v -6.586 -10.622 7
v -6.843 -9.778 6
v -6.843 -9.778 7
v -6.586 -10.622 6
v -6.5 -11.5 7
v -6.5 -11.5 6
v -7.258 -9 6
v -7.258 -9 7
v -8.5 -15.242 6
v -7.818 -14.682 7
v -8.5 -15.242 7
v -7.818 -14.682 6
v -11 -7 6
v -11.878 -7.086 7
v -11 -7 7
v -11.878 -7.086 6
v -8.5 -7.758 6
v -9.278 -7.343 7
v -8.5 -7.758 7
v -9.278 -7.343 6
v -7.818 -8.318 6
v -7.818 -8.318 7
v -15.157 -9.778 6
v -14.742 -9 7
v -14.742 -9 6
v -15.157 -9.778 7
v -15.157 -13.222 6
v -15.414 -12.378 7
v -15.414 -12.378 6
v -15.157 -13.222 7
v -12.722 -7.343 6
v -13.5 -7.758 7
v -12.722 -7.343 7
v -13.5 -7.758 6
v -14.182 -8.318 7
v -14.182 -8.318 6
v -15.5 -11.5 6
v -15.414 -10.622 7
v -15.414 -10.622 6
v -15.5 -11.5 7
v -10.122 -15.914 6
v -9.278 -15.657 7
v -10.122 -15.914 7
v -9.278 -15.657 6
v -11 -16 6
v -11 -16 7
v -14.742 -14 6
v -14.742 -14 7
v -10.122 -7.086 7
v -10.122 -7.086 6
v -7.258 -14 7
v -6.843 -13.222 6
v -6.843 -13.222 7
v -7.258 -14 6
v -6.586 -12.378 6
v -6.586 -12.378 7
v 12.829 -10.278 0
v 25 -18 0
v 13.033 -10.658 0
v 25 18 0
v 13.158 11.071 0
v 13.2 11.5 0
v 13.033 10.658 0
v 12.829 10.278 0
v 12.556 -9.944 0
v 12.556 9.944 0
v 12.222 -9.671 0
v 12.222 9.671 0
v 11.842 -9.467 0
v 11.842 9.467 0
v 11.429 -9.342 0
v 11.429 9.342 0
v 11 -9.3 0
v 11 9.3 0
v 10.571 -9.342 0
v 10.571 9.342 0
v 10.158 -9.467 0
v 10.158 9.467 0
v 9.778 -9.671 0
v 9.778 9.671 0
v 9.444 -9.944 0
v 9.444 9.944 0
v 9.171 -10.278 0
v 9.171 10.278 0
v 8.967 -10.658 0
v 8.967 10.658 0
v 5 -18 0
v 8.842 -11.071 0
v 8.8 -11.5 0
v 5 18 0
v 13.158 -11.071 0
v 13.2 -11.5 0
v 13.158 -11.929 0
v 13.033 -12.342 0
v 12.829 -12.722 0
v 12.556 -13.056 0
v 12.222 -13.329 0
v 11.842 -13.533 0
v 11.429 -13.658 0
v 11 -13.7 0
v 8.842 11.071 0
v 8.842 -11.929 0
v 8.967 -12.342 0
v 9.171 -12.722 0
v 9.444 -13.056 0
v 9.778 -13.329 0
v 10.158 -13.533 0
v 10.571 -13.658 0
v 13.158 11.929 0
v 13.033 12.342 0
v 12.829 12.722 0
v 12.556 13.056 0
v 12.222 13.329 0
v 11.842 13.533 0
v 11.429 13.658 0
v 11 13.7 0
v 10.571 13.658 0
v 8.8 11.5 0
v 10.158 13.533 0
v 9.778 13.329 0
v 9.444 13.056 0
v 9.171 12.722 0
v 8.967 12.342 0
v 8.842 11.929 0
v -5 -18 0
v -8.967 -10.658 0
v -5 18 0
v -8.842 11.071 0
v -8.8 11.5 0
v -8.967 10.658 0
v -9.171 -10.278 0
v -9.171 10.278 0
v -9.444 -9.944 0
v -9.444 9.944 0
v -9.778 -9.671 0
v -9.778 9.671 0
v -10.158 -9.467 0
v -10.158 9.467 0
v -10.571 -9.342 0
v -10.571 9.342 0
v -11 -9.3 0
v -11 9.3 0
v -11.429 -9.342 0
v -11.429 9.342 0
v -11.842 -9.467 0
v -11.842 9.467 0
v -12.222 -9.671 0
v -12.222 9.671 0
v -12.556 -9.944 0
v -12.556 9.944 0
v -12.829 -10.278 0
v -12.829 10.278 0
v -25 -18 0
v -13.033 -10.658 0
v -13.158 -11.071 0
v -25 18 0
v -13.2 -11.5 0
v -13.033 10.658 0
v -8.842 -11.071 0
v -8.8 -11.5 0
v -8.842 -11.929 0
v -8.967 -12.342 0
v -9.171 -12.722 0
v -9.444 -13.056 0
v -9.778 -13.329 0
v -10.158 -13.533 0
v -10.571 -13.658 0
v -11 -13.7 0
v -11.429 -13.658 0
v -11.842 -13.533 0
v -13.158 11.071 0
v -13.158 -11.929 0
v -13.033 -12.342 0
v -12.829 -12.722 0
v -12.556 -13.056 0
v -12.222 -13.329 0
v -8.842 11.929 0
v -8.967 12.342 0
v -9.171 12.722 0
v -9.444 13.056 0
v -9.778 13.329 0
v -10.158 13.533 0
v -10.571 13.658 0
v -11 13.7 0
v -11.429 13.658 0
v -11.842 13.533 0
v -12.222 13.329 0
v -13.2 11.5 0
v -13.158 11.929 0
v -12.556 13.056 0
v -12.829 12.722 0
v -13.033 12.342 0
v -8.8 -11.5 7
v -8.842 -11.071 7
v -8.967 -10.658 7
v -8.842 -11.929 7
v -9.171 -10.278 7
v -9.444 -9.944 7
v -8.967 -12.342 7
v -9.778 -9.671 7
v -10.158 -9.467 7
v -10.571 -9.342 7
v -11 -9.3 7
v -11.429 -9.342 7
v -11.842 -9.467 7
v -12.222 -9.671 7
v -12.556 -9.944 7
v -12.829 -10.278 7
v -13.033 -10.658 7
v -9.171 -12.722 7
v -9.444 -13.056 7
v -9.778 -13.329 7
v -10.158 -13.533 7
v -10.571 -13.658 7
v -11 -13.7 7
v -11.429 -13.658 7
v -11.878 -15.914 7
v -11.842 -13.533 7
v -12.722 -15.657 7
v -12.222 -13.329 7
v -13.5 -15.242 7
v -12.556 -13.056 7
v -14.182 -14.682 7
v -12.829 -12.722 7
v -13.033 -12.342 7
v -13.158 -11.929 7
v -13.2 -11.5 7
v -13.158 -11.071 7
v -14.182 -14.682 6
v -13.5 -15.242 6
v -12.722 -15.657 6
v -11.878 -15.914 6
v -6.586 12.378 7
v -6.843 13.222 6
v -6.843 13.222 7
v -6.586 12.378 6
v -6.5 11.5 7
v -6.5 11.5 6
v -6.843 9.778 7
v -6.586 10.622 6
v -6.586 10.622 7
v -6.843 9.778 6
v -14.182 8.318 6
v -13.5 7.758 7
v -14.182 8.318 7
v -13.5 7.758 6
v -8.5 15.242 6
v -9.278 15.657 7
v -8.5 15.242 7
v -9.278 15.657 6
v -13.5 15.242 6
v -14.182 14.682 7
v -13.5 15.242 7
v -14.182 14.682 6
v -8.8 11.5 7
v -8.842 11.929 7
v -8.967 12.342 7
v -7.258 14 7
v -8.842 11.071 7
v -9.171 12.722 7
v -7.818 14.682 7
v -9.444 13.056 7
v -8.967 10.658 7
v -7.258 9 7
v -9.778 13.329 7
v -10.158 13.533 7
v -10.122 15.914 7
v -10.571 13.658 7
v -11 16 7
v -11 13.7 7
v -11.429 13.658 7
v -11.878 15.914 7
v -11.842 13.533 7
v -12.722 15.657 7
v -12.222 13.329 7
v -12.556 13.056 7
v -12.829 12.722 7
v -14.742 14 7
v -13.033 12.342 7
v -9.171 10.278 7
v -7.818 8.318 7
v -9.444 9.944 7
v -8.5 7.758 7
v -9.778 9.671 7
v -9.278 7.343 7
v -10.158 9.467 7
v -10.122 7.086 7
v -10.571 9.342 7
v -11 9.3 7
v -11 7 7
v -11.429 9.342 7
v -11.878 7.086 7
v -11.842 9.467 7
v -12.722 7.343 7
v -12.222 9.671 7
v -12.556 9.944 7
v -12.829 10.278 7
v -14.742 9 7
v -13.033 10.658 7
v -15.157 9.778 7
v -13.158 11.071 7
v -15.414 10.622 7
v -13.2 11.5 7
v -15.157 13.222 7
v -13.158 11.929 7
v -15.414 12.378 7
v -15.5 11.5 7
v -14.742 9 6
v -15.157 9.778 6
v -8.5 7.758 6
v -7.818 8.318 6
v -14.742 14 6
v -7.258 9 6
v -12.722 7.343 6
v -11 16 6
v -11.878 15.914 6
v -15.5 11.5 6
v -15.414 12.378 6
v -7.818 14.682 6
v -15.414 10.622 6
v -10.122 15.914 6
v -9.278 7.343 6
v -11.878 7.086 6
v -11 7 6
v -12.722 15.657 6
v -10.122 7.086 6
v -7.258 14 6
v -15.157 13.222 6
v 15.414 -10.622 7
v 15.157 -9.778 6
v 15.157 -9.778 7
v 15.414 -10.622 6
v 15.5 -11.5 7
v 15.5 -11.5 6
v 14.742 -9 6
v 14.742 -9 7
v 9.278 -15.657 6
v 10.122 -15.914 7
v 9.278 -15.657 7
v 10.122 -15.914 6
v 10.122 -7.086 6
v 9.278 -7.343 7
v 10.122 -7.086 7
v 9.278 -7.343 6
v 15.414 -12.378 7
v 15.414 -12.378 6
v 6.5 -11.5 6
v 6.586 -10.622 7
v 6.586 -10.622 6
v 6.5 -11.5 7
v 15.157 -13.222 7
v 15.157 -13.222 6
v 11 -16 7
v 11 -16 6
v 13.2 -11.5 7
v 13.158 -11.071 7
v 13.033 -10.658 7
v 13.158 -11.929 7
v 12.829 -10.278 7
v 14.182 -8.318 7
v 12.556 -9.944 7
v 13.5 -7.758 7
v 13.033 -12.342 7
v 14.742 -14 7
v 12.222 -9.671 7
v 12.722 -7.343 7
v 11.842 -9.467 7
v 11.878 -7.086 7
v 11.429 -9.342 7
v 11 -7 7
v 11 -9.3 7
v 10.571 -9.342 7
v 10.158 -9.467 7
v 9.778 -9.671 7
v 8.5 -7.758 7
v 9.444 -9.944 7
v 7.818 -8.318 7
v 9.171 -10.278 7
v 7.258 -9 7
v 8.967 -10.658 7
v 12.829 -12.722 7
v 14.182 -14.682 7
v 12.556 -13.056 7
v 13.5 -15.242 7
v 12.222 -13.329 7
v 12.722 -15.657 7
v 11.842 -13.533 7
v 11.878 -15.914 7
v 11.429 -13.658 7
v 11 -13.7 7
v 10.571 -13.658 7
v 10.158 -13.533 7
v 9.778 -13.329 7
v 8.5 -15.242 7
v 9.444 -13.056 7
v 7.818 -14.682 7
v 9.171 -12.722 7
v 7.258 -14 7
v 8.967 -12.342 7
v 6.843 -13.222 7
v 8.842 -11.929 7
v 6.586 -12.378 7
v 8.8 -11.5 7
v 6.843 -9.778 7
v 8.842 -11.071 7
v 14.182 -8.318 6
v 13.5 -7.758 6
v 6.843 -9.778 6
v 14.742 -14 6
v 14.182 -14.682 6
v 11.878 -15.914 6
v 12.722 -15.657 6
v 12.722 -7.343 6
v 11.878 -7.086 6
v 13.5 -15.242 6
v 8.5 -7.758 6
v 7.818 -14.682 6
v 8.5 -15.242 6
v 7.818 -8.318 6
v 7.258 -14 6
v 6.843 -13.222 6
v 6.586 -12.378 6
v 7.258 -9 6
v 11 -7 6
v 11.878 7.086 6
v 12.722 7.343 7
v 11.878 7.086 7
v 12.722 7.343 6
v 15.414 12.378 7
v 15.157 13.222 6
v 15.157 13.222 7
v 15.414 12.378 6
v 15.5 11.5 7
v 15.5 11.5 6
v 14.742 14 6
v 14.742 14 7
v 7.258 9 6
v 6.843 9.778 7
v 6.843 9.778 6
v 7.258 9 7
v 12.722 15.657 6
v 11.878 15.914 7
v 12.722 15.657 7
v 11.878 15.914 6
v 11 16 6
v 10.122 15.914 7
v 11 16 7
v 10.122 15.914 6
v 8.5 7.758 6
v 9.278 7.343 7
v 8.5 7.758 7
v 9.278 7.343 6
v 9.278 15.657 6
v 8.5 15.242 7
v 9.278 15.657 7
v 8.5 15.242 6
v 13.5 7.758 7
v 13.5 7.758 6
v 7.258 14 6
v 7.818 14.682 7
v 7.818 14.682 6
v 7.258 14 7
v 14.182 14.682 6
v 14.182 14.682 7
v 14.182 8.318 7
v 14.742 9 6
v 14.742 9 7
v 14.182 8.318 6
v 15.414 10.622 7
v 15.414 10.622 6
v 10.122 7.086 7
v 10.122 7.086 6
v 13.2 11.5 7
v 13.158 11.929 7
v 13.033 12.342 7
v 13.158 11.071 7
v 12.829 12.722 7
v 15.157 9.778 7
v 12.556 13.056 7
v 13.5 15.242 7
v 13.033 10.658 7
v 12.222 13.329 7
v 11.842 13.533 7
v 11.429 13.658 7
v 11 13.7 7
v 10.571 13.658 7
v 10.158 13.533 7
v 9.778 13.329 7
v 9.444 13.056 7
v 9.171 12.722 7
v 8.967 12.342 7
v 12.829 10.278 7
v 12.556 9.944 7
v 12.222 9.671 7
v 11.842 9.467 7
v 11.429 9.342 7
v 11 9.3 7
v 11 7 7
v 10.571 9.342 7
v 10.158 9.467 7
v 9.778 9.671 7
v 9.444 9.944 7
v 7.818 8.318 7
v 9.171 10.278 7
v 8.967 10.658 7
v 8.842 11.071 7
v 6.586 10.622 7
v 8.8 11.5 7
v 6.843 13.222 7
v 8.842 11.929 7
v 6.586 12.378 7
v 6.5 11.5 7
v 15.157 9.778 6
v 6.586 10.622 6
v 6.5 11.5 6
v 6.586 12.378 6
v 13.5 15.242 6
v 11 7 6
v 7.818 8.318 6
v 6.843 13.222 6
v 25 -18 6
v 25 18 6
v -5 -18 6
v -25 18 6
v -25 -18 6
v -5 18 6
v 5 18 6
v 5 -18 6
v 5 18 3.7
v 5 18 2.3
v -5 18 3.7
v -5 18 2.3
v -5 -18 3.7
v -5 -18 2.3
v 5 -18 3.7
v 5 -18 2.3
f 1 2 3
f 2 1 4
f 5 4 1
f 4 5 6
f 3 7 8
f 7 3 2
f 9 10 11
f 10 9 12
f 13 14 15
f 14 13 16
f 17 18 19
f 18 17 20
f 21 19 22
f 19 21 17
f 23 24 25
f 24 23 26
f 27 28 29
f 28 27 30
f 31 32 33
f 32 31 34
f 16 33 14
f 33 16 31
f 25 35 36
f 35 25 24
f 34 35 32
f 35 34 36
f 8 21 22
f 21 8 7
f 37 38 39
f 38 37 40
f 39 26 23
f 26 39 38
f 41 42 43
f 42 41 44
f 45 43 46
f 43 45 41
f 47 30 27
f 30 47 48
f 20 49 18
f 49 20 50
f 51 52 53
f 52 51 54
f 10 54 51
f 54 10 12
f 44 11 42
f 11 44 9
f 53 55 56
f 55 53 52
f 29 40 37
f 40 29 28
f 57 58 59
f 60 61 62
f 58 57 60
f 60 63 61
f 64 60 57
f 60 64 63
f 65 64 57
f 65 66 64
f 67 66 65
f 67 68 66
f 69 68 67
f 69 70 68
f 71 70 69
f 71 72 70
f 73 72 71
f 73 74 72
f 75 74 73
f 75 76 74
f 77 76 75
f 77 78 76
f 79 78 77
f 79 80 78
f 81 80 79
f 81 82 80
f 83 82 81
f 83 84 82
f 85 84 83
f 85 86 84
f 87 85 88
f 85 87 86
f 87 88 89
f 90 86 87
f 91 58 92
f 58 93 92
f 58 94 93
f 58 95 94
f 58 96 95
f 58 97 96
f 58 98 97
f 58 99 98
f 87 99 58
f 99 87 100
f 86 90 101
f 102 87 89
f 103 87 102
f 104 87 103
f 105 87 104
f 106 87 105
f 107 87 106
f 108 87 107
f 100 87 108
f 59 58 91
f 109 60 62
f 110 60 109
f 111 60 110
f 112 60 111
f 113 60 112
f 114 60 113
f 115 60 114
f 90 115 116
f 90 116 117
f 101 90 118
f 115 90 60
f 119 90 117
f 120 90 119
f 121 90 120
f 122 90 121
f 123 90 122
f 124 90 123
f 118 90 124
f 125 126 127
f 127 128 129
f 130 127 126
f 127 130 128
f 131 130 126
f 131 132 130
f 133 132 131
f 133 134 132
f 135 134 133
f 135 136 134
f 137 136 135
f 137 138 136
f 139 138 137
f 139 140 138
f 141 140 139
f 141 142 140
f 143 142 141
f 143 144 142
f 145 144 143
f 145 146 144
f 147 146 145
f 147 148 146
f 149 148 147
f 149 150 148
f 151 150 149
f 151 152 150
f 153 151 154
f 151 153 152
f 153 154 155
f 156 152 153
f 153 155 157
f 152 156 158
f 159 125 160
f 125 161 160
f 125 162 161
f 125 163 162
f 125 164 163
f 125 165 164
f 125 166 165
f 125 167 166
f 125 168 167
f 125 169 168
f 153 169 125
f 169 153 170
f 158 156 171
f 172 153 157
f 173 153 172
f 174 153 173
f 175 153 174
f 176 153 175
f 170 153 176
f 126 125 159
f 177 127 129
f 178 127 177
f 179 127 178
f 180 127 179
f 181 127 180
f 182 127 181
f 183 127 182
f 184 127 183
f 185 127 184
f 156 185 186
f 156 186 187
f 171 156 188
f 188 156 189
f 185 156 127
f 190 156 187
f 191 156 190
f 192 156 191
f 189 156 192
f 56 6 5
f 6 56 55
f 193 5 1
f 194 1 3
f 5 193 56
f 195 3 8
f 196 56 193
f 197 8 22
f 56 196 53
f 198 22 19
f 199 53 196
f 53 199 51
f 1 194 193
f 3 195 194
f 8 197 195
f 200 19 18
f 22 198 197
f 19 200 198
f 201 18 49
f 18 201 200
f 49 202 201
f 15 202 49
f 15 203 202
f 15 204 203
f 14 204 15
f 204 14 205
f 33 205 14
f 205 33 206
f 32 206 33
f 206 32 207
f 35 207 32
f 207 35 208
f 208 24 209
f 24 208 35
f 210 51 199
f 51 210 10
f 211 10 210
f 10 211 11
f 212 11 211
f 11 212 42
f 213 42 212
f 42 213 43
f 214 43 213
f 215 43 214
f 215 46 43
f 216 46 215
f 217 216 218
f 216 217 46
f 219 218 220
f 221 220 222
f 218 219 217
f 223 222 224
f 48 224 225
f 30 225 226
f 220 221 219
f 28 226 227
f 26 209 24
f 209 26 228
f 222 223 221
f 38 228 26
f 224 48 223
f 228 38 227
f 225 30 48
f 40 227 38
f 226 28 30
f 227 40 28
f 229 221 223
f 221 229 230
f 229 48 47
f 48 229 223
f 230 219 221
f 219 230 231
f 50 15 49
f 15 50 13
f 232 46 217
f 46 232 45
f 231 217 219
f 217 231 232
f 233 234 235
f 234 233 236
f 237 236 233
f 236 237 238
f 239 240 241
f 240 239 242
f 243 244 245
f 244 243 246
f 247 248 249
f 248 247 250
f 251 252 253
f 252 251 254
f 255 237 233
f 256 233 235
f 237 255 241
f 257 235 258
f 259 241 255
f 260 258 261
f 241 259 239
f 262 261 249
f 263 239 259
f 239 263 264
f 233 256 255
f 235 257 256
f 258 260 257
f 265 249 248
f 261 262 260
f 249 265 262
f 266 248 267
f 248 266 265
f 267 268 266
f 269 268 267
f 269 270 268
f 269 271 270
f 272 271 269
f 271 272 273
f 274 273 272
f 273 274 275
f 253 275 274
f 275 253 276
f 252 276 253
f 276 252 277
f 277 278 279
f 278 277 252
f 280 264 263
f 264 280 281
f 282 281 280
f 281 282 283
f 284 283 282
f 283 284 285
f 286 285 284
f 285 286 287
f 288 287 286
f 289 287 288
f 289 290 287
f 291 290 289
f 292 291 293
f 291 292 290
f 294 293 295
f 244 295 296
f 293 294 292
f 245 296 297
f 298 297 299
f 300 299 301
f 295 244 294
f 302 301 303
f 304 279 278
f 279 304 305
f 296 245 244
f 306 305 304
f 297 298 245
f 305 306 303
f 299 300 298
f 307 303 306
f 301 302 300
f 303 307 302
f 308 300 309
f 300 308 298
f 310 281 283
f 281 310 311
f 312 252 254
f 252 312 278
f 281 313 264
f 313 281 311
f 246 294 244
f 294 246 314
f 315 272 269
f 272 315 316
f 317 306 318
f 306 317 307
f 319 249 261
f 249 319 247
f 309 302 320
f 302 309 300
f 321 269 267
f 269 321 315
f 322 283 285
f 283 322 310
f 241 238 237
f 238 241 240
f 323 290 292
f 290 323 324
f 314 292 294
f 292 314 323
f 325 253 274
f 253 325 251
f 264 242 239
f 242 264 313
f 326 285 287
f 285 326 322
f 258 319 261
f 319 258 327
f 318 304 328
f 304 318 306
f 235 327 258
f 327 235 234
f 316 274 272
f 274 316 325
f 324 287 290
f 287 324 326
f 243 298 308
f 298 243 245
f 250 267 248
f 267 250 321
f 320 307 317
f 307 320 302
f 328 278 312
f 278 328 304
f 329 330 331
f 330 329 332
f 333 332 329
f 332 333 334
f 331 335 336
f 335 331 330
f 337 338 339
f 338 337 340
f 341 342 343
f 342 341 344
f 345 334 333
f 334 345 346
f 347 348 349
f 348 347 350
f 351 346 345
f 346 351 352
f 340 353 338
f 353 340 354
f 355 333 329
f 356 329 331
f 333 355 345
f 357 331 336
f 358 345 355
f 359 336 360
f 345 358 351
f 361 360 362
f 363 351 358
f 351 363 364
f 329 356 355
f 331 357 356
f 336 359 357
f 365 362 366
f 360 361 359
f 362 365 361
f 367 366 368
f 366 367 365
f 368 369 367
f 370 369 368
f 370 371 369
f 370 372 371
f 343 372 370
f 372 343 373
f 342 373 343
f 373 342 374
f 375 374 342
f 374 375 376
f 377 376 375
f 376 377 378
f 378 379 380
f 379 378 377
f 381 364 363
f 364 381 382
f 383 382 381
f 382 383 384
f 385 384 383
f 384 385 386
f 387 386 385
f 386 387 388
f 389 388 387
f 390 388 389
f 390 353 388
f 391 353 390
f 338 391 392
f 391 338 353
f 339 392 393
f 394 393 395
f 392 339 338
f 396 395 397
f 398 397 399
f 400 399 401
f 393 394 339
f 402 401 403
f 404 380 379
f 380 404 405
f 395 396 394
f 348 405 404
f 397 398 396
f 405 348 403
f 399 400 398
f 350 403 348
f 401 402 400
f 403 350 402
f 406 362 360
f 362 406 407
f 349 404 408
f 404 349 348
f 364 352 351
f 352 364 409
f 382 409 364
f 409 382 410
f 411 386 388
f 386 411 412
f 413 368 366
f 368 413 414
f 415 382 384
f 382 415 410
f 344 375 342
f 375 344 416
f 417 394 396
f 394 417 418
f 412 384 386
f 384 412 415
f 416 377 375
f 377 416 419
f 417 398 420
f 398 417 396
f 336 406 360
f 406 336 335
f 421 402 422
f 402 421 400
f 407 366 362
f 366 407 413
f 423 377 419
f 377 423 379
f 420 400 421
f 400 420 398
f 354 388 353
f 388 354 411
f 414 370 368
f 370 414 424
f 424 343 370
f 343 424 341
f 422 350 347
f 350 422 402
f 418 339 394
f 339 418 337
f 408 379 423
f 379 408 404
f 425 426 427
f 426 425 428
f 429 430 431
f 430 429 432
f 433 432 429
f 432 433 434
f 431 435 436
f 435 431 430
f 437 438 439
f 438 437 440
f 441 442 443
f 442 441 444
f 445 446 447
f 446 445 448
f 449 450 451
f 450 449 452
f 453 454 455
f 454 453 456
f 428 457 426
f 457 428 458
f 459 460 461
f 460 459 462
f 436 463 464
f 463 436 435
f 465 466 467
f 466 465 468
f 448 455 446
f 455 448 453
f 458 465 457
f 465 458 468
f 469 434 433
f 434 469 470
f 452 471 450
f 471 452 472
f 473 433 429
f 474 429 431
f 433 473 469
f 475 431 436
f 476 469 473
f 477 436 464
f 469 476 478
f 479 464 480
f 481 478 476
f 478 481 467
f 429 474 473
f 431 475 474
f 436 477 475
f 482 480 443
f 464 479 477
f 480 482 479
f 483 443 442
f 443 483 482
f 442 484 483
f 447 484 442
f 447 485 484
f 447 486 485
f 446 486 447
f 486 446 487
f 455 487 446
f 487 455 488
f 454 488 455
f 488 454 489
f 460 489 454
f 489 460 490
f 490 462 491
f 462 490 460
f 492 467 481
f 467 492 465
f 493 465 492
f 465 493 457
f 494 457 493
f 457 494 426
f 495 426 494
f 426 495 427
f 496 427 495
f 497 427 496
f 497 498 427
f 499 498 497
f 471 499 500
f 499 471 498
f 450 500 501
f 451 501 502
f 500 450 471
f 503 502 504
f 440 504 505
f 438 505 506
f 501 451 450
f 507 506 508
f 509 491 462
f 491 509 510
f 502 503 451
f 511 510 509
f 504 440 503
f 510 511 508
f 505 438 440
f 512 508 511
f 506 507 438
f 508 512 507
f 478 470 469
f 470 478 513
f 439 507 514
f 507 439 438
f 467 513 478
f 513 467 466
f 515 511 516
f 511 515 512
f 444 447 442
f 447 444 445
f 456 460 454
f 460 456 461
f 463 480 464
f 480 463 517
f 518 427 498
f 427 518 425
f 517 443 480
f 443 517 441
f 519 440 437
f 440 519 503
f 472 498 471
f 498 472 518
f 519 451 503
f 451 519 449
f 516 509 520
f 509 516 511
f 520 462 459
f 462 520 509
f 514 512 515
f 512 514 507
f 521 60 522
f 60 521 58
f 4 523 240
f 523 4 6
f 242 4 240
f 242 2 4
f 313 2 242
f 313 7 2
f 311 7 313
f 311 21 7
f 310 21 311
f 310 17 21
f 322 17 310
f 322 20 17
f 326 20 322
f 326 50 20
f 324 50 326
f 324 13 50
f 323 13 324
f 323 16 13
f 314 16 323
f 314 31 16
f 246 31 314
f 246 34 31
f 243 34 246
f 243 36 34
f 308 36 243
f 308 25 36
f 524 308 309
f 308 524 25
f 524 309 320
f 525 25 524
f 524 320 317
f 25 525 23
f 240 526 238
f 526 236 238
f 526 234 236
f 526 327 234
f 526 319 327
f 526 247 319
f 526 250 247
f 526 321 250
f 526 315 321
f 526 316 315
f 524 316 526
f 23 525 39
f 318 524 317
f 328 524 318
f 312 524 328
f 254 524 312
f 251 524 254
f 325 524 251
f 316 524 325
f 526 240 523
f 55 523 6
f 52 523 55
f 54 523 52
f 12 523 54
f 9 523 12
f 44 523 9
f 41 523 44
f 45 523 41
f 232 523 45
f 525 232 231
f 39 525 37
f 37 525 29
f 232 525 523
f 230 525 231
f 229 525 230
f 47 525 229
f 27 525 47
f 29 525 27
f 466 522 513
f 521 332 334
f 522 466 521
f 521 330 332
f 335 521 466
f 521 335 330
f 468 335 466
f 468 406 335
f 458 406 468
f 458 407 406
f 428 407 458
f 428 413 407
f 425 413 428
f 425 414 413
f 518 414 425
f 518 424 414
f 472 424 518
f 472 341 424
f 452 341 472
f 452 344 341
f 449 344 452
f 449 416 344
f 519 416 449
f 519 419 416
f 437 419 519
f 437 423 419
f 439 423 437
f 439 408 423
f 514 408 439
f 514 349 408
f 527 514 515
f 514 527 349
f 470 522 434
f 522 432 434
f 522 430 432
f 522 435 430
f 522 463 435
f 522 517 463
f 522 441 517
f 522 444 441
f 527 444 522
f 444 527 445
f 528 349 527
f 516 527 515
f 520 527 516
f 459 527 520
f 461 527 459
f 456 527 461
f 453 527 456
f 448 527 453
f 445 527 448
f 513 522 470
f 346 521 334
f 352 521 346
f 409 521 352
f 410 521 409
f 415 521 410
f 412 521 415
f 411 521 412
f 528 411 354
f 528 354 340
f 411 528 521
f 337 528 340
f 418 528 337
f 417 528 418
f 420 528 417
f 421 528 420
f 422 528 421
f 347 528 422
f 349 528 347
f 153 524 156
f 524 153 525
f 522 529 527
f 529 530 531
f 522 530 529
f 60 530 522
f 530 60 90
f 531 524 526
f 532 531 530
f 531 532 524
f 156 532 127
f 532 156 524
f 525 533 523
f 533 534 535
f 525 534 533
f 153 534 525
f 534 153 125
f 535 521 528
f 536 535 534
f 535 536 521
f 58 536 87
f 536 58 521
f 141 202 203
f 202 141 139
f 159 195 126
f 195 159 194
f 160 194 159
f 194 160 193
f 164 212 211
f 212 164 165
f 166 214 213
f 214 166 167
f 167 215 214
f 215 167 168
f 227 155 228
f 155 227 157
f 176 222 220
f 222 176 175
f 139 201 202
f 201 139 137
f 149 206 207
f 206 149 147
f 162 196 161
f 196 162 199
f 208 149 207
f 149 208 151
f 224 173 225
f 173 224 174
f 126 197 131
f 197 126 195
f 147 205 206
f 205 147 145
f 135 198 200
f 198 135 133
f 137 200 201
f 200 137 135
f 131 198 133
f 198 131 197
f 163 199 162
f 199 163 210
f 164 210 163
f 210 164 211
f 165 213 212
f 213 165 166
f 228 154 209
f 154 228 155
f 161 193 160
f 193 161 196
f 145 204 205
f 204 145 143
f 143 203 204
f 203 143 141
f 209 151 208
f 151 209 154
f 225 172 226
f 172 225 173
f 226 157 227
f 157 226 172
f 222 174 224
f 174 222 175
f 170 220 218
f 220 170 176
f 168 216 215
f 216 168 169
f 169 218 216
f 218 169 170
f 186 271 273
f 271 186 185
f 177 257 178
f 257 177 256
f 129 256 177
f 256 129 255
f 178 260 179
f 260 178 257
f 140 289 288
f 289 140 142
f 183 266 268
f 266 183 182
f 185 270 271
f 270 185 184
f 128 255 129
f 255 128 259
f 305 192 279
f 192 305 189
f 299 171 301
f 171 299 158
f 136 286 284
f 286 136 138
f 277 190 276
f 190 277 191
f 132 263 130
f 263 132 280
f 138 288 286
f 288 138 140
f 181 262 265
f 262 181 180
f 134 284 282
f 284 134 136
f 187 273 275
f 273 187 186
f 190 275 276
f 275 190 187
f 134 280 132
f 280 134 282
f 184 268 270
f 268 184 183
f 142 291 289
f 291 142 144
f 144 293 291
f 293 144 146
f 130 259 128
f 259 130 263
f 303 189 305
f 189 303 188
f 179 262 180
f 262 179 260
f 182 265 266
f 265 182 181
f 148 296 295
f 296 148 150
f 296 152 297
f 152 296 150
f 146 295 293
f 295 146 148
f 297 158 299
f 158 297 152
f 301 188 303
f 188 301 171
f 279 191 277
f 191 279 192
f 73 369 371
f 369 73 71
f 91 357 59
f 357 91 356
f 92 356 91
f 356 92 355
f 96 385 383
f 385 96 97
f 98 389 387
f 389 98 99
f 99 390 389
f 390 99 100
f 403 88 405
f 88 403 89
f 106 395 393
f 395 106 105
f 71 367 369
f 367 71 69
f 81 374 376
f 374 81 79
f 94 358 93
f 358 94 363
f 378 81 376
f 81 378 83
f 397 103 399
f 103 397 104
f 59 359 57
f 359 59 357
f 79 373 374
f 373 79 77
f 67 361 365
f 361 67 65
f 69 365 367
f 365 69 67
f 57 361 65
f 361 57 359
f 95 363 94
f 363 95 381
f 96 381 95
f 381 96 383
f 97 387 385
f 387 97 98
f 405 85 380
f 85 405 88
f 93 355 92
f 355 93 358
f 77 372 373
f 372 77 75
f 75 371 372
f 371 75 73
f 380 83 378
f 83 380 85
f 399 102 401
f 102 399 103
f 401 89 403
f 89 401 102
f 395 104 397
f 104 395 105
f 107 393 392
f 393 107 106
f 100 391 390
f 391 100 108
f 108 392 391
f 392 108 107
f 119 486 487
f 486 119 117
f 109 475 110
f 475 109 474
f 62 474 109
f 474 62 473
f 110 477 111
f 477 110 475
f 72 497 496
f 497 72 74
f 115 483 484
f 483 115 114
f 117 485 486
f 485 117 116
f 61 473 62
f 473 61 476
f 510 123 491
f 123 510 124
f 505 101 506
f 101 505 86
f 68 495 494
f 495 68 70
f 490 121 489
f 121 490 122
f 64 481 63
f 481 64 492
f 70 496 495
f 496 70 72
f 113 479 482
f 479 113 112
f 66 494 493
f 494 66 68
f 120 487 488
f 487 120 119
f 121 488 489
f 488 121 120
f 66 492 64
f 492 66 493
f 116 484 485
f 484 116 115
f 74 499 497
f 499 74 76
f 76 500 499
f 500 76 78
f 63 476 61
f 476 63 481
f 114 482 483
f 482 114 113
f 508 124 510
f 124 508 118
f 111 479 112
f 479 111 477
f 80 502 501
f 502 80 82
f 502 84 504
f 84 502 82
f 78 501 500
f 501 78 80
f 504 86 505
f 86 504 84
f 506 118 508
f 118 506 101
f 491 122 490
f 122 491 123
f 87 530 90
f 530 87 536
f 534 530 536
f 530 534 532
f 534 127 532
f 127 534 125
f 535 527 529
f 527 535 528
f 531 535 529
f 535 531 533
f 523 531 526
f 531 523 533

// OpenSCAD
$fn = 32;

// ----------------------------------------------------------------------
// Living hinge: 50 x 36 mm plates, 1.4 mm flexible web
// ----------------------------------------------------------------------

// --- parameters (mm) ---
plate_len = 20;           // plate length outside the web
plate_w = 36;             // plate width
thick = 6;                // plate thickness
web_half = 5;             // half width of the flex band
web_t = 1.4;              // flexible web thickness
web_z = 2.3;              // web position inside the thickness
boss_d = 9;               // screw boss diameter
boss_h = 7;               // screw boss height
boss_x = 11;              // screw boss distance from the web
screw_d = 4.4;            // screw hole

difference() {
  union() {
    /* one flat strip, later thinned at the middle */
    translate([-25, -18, 0]) cube([50, 36, 6]);
    /* screw bosses, sunk 0.5 mm into the plates */
    for (sx = [-11, 11]) {
      for (sy = [-11.5, 11.5]) {
        translate([sx, sy, 0]) cylinder(h = boss_h, d = boss_d);
      }
    }
  }
  /* channel from below: leaves the web on top of it */
  translate([-5, -20.5, -2.5]) cube([10, 41, 4.8]);
  /* channel from above: thins the web down to web_t */
  translate([-5, -20.5, 3.7]) cube([10, 41, 4.8]);
  /* screw holes through the bosses */
  for (sx = [-11, 11]) {
    for (sy = [-11.5, 11.5]) {
      translate([sx, sy, -2.5]) cylinder(h = boss_h + 5, d = screw_d);
    }
  }
}
